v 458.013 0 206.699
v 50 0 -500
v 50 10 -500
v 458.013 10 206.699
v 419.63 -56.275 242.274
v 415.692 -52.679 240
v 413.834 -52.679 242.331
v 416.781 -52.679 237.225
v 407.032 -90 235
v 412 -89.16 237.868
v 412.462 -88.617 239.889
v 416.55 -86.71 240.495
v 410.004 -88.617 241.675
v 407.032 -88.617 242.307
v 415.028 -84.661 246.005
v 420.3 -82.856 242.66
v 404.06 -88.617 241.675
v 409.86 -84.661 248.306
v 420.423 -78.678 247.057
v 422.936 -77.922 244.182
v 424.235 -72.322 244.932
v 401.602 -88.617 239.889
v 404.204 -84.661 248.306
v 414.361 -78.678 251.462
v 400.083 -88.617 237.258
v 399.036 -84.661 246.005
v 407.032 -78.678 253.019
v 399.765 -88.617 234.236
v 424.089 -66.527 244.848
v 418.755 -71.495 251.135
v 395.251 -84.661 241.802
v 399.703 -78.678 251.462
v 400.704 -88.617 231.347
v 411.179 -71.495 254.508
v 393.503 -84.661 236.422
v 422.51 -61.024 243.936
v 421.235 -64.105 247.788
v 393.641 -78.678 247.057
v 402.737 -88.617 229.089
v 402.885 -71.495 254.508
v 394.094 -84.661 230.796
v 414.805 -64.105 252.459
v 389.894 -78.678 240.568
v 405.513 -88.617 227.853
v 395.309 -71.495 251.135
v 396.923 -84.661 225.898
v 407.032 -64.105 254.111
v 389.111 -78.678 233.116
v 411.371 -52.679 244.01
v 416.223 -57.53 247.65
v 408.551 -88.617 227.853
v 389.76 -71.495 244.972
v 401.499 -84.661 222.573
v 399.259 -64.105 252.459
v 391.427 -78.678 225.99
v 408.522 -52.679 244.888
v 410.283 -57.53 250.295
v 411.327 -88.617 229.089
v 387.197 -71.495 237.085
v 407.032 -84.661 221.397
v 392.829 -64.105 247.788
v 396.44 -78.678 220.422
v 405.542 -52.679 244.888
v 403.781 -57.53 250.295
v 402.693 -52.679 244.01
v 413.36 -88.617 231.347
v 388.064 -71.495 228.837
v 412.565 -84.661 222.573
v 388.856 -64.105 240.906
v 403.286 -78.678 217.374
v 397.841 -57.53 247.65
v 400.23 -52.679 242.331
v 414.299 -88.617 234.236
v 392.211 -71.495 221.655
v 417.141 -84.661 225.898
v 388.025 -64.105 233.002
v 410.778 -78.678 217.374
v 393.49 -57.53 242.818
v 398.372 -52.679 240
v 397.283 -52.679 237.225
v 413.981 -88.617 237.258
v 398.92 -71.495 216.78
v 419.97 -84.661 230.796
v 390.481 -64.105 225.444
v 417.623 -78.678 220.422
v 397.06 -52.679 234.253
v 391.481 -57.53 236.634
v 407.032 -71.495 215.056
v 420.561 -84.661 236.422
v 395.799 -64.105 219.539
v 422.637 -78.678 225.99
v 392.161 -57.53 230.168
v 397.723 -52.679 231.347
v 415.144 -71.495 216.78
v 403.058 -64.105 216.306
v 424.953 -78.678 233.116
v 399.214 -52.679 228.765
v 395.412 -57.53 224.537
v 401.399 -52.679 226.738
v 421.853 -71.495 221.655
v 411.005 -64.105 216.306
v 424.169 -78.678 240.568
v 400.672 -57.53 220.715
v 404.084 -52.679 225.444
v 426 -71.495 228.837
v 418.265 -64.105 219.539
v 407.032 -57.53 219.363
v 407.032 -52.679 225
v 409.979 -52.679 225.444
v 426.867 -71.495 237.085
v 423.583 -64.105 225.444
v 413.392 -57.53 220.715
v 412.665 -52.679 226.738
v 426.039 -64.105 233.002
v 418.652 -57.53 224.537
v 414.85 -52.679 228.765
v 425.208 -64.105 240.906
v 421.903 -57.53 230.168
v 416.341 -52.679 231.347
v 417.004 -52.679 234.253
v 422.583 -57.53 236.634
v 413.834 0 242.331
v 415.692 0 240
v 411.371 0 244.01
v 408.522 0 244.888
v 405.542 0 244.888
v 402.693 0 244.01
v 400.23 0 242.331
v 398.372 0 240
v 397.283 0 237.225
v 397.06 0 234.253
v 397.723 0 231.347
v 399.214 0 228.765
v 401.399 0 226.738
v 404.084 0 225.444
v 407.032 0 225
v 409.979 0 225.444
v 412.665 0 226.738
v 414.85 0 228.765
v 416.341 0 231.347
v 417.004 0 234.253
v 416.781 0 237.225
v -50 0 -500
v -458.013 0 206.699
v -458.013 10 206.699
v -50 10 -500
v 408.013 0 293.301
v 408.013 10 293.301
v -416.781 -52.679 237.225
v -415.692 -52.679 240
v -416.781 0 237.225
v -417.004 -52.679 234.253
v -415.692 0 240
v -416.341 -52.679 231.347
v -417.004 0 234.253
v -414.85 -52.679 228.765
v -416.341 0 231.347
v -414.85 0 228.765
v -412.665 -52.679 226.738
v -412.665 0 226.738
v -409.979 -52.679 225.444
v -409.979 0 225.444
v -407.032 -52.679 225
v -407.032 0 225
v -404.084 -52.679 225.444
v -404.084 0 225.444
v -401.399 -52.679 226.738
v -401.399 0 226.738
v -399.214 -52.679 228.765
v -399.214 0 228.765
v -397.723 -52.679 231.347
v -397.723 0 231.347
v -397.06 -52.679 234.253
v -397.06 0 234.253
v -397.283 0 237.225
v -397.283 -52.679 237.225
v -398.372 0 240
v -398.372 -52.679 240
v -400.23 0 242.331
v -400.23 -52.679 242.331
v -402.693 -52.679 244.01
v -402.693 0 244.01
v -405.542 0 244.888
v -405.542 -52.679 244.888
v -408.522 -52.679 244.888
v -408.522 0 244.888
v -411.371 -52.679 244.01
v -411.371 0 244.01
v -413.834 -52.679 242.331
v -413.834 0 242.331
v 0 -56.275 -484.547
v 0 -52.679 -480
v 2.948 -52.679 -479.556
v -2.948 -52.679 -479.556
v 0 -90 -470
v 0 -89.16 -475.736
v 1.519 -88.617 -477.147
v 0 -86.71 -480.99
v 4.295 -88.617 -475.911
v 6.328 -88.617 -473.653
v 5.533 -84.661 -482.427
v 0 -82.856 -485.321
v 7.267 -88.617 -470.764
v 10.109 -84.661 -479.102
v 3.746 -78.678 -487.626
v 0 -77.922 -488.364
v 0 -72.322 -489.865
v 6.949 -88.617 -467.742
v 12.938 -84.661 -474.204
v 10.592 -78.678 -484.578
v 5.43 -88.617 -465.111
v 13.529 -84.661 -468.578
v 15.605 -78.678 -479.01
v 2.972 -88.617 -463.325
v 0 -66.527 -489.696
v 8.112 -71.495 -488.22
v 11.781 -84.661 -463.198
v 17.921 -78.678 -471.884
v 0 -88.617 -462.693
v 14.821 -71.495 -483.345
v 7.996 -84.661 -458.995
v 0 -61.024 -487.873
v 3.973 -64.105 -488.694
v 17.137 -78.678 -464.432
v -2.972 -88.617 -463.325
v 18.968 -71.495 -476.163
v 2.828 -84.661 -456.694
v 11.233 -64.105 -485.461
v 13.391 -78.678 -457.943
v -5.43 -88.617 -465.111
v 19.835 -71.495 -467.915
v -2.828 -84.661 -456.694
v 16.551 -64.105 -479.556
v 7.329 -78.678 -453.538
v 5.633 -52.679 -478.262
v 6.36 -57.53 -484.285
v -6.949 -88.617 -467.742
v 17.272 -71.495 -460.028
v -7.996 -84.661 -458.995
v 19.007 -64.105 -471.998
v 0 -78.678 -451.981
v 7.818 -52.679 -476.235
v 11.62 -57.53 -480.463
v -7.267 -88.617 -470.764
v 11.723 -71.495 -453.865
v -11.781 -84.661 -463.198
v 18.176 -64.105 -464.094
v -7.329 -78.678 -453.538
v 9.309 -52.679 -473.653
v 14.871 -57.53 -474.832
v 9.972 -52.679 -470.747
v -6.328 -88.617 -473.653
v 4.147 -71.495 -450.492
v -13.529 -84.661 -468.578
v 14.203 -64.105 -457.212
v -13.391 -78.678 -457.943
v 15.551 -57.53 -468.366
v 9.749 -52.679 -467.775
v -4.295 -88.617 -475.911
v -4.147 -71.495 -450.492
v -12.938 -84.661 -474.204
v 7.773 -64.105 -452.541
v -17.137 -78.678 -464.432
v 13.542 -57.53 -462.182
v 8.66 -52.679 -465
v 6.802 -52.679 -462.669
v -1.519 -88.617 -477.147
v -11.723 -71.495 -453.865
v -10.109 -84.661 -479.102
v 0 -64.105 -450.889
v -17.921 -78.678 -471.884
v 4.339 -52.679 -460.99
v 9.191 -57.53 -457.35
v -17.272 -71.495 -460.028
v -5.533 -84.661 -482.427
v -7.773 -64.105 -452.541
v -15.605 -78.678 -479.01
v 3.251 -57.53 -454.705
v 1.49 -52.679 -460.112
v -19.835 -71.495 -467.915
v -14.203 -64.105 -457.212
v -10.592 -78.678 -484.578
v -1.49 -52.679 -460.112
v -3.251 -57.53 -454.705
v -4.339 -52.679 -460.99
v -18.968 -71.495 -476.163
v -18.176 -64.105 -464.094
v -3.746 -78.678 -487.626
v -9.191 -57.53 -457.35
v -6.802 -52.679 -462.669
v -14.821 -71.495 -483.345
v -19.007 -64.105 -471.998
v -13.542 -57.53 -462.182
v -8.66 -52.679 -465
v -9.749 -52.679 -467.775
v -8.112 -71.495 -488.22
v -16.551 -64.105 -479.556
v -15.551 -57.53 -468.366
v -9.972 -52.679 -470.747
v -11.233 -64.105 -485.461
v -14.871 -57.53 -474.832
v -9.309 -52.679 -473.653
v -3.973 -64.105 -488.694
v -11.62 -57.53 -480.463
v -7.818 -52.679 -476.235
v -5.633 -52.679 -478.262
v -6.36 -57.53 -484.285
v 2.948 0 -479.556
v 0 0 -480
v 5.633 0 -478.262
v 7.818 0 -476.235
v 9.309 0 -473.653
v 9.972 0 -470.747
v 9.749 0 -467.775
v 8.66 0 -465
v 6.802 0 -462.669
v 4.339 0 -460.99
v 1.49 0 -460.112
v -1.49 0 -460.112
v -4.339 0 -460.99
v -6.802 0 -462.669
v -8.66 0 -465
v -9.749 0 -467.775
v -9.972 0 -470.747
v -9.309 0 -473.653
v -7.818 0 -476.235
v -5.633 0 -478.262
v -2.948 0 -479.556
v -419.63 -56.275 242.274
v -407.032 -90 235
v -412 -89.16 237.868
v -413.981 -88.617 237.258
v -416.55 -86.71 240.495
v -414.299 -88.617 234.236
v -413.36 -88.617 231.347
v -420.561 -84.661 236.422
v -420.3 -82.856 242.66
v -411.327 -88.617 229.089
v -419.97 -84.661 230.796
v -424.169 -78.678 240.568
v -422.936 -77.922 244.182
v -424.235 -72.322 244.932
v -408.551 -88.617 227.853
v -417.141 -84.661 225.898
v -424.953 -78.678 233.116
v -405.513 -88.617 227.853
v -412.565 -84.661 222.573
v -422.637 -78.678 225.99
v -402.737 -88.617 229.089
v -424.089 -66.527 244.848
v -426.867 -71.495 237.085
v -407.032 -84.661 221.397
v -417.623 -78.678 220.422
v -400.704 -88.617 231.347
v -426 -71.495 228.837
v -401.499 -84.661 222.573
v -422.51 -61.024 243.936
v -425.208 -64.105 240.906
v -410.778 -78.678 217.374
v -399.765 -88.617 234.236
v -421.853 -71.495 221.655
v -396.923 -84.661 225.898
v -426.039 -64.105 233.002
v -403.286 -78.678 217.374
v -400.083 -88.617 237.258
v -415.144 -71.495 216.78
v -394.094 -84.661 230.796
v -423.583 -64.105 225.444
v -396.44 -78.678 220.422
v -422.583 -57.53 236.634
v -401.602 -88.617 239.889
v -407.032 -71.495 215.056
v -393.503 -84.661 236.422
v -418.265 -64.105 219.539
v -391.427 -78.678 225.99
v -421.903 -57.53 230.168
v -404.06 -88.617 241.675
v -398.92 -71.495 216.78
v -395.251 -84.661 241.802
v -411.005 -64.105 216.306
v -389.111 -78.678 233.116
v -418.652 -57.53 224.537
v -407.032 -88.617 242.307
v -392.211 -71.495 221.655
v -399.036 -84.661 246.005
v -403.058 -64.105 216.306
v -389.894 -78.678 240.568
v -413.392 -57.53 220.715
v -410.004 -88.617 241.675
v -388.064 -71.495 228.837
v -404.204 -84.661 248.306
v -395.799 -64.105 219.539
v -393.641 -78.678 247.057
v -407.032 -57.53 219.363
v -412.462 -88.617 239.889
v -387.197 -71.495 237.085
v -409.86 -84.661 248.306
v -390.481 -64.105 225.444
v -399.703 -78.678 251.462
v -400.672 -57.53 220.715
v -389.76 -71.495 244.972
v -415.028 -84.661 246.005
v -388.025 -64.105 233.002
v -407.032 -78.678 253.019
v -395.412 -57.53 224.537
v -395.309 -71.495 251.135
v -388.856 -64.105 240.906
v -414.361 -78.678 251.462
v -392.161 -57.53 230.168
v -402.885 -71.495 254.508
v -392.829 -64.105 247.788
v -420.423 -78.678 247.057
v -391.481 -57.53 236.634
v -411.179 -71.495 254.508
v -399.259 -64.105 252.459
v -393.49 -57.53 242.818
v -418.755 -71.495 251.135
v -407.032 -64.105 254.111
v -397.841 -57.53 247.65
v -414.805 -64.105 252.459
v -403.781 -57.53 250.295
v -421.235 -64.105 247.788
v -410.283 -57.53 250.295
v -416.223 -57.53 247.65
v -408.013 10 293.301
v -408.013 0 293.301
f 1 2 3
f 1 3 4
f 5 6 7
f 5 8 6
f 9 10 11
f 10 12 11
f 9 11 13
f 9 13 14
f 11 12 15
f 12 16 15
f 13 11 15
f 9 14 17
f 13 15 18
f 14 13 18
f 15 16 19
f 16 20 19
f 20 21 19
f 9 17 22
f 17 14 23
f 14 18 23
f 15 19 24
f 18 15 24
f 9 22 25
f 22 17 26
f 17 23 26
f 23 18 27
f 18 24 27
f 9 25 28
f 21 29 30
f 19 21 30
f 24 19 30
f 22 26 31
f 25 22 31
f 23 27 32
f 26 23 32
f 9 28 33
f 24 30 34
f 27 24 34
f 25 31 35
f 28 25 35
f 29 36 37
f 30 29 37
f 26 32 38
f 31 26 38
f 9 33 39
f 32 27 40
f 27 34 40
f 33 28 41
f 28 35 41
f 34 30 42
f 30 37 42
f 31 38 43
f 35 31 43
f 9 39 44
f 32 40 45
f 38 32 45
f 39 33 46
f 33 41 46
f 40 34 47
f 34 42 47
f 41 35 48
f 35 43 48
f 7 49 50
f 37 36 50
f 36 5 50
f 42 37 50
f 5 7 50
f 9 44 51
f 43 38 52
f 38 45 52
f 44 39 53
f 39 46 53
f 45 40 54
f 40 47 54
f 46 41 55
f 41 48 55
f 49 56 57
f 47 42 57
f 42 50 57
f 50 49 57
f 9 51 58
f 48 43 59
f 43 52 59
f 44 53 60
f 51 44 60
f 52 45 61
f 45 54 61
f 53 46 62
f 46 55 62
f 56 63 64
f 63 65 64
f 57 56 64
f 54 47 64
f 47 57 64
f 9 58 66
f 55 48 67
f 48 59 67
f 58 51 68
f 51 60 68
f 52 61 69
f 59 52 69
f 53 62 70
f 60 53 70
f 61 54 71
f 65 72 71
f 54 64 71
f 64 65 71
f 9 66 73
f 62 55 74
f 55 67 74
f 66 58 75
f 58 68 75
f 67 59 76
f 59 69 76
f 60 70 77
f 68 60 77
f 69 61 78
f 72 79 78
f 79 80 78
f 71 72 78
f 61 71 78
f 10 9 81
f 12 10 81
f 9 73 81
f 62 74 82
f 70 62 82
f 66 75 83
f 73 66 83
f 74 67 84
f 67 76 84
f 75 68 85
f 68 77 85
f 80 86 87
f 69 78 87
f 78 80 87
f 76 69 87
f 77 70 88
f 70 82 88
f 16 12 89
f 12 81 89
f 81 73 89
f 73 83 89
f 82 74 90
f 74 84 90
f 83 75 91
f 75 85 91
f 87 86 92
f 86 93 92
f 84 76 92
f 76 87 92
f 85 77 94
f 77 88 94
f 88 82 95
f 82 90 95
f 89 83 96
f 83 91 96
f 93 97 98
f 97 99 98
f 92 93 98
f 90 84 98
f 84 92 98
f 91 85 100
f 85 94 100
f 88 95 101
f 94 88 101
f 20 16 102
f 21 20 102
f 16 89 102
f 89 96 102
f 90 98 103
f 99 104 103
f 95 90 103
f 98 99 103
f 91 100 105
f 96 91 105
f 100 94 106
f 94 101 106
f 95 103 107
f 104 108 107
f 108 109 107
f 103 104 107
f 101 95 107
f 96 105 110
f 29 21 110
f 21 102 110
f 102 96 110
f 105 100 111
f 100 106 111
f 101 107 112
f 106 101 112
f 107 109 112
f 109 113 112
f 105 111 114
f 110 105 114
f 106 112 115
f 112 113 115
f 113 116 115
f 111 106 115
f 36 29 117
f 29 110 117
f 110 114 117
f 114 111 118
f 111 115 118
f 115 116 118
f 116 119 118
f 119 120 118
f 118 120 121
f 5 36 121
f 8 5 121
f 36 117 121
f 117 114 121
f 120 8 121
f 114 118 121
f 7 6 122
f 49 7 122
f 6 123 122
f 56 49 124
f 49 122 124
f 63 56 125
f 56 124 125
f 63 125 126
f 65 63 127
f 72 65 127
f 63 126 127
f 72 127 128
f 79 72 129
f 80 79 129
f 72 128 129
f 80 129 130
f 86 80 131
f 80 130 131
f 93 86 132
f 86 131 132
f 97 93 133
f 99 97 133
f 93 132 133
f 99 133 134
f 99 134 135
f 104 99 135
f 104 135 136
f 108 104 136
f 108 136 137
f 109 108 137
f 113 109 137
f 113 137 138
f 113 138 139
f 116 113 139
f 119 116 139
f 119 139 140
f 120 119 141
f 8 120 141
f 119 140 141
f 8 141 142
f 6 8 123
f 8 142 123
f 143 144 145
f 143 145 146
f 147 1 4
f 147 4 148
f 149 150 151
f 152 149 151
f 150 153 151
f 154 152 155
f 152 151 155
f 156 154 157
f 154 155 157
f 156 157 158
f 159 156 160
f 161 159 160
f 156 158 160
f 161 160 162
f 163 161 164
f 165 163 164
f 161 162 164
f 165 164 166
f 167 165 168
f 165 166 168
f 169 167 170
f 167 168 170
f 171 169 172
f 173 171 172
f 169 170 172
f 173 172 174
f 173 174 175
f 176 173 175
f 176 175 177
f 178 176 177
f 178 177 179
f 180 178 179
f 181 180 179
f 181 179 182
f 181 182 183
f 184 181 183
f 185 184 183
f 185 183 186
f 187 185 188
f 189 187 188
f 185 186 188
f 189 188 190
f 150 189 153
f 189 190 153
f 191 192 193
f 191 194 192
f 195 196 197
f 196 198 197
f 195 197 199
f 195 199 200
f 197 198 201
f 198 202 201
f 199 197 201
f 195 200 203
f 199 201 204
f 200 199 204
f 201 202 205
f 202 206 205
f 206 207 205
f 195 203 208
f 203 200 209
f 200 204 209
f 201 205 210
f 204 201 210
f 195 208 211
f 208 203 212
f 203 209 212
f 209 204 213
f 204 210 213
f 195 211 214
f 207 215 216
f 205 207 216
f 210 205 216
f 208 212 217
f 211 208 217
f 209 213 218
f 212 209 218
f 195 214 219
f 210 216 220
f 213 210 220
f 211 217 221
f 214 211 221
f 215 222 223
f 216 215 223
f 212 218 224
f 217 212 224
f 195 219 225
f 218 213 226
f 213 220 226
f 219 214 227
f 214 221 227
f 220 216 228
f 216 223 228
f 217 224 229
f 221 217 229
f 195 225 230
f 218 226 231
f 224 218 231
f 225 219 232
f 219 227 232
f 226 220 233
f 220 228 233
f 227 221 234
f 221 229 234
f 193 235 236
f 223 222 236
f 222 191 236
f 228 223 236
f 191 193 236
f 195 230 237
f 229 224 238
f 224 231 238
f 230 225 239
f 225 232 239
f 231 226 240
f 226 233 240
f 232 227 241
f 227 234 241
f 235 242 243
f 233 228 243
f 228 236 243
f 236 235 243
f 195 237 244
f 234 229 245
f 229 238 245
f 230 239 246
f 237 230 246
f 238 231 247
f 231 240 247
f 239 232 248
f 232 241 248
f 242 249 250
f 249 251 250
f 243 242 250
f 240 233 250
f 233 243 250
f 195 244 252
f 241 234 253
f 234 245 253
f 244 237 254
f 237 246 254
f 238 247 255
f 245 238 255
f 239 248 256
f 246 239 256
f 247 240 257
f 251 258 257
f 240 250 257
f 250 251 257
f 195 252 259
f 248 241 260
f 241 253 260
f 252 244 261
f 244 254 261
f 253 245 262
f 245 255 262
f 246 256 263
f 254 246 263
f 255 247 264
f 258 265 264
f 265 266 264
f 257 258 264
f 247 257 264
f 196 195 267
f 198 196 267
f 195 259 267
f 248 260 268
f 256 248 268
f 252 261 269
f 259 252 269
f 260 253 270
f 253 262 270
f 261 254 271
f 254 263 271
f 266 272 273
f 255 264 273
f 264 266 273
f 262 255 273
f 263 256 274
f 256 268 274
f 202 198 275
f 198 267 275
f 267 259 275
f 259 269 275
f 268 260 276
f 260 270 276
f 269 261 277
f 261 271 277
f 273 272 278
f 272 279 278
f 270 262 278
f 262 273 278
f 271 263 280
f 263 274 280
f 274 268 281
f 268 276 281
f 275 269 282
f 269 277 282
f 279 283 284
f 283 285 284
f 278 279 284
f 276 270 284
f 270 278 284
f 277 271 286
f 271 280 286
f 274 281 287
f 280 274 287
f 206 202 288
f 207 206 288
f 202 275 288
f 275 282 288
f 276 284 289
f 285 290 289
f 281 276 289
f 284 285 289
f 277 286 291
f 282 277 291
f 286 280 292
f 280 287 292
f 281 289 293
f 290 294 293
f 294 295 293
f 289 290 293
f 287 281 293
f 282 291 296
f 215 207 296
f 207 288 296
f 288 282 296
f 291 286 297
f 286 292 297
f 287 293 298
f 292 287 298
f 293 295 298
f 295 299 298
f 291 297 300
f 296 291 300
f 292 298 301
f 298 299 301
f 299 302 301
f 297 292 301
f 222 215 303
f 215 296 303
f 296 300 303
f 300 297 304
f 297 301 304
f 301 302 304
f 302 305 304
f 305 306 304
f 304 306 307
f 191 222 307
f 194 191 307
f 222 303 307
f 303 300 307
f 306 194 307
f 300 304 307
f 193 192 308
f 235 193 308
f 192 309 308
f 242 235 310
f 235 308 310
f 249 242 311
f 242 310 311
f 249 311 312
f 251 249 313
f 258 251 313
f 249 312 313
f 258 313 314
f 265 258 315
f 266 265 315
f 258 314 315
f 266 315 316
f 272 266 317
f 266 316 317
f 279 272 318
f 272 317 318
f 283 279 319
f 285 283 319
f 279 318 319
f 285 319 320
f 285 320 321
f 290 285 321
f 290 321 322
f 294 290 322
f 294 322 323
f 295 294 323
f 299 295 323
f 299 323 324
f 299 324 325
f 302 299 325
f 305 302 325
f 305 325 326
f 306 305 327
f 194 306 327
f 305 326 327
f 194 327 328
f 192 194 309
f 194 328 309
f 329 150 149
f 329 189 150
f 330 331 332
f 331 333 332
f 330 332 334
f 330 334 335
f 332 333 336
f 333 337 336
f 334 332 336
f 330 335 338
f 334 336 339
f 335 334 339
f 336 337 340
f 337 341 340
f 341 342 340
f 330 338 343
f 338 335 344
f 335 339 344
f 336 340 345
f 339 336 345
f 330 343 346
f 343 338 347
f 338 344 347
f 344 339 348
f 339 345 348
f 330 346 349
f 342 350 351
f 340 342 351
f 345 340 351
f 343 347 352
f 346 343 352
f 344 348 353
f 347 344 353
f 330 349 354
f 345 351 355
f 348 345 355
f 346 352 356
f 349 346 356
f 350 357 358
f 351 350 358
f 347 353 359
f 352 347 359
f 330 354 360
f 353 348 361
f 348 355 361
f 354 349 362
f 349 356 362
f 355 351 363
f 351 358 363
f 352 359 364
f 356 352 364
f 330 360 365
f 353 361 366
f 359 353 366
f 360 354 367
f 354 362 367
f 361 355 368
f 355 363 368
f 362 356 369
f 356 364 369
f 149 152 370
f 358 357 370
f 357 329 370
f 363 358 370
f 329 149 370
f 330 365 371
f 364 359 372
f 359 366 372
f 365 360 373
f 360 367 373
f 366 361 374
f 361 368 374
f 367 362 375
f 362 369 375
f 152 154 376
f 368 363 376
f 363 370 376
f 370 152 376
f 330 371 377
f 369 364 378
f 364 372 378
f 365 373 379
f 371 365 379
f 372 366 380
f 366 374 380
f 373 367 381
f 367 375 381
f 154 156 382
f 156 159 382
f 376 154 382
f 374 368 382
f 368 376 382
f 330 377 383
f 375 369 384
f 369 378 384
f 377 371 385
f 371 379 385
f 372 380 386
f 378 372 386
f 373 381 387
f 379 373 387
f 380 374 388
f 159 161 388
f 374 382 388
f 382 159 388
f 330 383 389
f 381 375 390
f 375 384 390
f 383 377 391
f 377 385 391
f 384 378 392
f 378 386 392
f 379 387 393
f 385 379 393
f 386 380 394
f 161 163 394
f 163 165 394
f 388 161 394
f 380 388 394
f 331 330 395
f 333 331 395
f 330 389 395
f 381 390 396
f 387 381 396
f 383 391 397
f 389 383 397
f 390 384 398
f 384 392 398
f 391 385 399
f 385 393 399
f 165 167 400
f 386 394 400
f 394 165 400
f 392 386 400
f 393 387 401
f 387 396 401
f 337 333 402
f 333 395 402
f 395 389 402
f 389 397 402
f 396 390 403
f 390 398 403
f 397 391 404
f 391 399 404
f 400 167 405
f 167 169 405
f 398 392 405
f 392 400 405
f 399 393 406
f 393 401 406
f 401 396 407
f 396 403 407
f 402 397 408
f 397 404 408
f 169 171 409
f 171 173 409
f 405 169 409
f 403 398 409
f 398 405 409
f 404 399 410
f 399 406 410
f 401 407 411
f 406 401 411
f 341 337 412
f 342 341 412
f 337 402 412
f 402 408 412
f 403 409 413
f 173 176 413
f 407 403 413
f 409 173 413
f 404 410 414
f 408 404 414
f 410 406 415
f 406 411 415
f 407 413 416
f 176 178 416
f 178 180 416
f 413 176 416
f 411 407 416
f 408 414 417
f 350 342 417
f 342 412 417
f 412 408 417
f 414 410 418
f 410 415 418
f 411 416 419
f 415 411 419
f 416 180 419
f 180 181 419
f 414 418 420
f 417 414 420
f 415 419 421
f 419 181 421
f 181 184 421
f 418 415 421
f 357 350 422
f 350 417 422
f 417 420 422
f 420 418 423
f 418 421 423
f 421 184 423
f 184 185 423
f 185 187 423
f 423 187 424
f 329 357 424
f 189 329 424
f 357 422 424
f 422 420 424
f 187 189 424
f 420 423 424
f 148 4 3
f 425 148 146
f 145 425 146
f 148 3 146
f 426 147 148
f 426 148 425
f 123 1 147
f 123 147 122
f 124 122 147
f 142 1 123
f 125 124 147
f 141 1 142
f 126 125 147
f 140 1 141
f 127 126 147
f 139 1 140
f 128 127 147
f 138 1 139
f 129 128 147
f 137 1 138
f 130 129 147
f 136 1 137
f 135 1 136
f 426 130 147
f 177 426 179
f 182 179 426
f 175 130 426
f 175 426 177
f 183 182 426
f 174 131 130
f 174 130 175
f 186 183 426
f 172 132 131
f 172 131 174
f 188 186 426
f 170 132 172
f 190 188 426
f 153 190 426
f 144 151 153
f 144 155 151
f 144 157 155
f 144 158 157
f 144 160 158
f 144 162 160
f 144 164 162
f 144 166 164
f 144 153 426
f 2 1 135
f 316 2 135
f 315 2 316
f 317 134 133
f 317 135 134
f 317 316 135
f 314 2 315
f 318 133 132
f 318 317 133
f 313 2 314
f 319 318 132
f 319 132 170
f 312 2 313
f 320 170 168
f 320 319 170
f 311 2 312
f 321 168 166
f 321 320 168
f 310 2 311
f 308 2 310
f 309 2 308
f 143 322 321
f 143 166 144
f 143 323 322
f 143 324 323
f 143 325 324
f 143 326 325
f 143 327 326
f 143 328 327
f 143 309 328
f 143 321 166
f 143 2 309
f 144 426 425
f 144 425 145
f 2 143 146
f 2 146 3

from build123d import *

# Parameters (mm, degrees)
SALIENTE_EXTRUIR1_DEPTH = 10
MATRIZC1_COUNT          = 3


with BuildPart() as part:
    # Croquis1 → Saliente-Extruir1 (new body)
    with BuildSketch(Plane(origin=(0, 0, 0), x_dir=(1, 0, 0), z_dir=(0, 1, 0))):
        Polygon((-50, 500), (50, 500), (458.012701892, -206.698729811), (408.012701892, -293.301270189), (-408.012701892, -293.301270189), (-458.012701892, -206.698729811), align=None)
    extrude(amount=SALIENTE_EXTRUIR1_DEPTH)

    # Croquis2 → Revolución1 (revolve)
    with BuildSketch(Plane(origin=(0, 0, 0), x_dir=(0, 0, -1), z_dir=(1, 0, 0))):
        with BuildLine():
            Line((470, 0), (470, -70))
            Line((470, -70), (470, -90))
            ThreePointArc((470, -90), (489.318516526, -75.176380902), (480, -52.679491924))
            Line((480, -52.679491924), (480, 0))
            Line((480, 0), (470, 0))
        make_face()
    revoluci_n1 = revolve(axis=Axis((0, 0, -470), (0, -1, 0)))

    # MatrizC1: Revolución1 ×3 about axis
    matrizc1_axis = Axis((0, 0, 0), (0, 1, 0))
    for i in range(1, MATRIZC1_COUNT):
        add(revoluci_n1.rotate(matrizc1_axis, i * 360 / MATRIZC1_COUNT))


solid = part.part
